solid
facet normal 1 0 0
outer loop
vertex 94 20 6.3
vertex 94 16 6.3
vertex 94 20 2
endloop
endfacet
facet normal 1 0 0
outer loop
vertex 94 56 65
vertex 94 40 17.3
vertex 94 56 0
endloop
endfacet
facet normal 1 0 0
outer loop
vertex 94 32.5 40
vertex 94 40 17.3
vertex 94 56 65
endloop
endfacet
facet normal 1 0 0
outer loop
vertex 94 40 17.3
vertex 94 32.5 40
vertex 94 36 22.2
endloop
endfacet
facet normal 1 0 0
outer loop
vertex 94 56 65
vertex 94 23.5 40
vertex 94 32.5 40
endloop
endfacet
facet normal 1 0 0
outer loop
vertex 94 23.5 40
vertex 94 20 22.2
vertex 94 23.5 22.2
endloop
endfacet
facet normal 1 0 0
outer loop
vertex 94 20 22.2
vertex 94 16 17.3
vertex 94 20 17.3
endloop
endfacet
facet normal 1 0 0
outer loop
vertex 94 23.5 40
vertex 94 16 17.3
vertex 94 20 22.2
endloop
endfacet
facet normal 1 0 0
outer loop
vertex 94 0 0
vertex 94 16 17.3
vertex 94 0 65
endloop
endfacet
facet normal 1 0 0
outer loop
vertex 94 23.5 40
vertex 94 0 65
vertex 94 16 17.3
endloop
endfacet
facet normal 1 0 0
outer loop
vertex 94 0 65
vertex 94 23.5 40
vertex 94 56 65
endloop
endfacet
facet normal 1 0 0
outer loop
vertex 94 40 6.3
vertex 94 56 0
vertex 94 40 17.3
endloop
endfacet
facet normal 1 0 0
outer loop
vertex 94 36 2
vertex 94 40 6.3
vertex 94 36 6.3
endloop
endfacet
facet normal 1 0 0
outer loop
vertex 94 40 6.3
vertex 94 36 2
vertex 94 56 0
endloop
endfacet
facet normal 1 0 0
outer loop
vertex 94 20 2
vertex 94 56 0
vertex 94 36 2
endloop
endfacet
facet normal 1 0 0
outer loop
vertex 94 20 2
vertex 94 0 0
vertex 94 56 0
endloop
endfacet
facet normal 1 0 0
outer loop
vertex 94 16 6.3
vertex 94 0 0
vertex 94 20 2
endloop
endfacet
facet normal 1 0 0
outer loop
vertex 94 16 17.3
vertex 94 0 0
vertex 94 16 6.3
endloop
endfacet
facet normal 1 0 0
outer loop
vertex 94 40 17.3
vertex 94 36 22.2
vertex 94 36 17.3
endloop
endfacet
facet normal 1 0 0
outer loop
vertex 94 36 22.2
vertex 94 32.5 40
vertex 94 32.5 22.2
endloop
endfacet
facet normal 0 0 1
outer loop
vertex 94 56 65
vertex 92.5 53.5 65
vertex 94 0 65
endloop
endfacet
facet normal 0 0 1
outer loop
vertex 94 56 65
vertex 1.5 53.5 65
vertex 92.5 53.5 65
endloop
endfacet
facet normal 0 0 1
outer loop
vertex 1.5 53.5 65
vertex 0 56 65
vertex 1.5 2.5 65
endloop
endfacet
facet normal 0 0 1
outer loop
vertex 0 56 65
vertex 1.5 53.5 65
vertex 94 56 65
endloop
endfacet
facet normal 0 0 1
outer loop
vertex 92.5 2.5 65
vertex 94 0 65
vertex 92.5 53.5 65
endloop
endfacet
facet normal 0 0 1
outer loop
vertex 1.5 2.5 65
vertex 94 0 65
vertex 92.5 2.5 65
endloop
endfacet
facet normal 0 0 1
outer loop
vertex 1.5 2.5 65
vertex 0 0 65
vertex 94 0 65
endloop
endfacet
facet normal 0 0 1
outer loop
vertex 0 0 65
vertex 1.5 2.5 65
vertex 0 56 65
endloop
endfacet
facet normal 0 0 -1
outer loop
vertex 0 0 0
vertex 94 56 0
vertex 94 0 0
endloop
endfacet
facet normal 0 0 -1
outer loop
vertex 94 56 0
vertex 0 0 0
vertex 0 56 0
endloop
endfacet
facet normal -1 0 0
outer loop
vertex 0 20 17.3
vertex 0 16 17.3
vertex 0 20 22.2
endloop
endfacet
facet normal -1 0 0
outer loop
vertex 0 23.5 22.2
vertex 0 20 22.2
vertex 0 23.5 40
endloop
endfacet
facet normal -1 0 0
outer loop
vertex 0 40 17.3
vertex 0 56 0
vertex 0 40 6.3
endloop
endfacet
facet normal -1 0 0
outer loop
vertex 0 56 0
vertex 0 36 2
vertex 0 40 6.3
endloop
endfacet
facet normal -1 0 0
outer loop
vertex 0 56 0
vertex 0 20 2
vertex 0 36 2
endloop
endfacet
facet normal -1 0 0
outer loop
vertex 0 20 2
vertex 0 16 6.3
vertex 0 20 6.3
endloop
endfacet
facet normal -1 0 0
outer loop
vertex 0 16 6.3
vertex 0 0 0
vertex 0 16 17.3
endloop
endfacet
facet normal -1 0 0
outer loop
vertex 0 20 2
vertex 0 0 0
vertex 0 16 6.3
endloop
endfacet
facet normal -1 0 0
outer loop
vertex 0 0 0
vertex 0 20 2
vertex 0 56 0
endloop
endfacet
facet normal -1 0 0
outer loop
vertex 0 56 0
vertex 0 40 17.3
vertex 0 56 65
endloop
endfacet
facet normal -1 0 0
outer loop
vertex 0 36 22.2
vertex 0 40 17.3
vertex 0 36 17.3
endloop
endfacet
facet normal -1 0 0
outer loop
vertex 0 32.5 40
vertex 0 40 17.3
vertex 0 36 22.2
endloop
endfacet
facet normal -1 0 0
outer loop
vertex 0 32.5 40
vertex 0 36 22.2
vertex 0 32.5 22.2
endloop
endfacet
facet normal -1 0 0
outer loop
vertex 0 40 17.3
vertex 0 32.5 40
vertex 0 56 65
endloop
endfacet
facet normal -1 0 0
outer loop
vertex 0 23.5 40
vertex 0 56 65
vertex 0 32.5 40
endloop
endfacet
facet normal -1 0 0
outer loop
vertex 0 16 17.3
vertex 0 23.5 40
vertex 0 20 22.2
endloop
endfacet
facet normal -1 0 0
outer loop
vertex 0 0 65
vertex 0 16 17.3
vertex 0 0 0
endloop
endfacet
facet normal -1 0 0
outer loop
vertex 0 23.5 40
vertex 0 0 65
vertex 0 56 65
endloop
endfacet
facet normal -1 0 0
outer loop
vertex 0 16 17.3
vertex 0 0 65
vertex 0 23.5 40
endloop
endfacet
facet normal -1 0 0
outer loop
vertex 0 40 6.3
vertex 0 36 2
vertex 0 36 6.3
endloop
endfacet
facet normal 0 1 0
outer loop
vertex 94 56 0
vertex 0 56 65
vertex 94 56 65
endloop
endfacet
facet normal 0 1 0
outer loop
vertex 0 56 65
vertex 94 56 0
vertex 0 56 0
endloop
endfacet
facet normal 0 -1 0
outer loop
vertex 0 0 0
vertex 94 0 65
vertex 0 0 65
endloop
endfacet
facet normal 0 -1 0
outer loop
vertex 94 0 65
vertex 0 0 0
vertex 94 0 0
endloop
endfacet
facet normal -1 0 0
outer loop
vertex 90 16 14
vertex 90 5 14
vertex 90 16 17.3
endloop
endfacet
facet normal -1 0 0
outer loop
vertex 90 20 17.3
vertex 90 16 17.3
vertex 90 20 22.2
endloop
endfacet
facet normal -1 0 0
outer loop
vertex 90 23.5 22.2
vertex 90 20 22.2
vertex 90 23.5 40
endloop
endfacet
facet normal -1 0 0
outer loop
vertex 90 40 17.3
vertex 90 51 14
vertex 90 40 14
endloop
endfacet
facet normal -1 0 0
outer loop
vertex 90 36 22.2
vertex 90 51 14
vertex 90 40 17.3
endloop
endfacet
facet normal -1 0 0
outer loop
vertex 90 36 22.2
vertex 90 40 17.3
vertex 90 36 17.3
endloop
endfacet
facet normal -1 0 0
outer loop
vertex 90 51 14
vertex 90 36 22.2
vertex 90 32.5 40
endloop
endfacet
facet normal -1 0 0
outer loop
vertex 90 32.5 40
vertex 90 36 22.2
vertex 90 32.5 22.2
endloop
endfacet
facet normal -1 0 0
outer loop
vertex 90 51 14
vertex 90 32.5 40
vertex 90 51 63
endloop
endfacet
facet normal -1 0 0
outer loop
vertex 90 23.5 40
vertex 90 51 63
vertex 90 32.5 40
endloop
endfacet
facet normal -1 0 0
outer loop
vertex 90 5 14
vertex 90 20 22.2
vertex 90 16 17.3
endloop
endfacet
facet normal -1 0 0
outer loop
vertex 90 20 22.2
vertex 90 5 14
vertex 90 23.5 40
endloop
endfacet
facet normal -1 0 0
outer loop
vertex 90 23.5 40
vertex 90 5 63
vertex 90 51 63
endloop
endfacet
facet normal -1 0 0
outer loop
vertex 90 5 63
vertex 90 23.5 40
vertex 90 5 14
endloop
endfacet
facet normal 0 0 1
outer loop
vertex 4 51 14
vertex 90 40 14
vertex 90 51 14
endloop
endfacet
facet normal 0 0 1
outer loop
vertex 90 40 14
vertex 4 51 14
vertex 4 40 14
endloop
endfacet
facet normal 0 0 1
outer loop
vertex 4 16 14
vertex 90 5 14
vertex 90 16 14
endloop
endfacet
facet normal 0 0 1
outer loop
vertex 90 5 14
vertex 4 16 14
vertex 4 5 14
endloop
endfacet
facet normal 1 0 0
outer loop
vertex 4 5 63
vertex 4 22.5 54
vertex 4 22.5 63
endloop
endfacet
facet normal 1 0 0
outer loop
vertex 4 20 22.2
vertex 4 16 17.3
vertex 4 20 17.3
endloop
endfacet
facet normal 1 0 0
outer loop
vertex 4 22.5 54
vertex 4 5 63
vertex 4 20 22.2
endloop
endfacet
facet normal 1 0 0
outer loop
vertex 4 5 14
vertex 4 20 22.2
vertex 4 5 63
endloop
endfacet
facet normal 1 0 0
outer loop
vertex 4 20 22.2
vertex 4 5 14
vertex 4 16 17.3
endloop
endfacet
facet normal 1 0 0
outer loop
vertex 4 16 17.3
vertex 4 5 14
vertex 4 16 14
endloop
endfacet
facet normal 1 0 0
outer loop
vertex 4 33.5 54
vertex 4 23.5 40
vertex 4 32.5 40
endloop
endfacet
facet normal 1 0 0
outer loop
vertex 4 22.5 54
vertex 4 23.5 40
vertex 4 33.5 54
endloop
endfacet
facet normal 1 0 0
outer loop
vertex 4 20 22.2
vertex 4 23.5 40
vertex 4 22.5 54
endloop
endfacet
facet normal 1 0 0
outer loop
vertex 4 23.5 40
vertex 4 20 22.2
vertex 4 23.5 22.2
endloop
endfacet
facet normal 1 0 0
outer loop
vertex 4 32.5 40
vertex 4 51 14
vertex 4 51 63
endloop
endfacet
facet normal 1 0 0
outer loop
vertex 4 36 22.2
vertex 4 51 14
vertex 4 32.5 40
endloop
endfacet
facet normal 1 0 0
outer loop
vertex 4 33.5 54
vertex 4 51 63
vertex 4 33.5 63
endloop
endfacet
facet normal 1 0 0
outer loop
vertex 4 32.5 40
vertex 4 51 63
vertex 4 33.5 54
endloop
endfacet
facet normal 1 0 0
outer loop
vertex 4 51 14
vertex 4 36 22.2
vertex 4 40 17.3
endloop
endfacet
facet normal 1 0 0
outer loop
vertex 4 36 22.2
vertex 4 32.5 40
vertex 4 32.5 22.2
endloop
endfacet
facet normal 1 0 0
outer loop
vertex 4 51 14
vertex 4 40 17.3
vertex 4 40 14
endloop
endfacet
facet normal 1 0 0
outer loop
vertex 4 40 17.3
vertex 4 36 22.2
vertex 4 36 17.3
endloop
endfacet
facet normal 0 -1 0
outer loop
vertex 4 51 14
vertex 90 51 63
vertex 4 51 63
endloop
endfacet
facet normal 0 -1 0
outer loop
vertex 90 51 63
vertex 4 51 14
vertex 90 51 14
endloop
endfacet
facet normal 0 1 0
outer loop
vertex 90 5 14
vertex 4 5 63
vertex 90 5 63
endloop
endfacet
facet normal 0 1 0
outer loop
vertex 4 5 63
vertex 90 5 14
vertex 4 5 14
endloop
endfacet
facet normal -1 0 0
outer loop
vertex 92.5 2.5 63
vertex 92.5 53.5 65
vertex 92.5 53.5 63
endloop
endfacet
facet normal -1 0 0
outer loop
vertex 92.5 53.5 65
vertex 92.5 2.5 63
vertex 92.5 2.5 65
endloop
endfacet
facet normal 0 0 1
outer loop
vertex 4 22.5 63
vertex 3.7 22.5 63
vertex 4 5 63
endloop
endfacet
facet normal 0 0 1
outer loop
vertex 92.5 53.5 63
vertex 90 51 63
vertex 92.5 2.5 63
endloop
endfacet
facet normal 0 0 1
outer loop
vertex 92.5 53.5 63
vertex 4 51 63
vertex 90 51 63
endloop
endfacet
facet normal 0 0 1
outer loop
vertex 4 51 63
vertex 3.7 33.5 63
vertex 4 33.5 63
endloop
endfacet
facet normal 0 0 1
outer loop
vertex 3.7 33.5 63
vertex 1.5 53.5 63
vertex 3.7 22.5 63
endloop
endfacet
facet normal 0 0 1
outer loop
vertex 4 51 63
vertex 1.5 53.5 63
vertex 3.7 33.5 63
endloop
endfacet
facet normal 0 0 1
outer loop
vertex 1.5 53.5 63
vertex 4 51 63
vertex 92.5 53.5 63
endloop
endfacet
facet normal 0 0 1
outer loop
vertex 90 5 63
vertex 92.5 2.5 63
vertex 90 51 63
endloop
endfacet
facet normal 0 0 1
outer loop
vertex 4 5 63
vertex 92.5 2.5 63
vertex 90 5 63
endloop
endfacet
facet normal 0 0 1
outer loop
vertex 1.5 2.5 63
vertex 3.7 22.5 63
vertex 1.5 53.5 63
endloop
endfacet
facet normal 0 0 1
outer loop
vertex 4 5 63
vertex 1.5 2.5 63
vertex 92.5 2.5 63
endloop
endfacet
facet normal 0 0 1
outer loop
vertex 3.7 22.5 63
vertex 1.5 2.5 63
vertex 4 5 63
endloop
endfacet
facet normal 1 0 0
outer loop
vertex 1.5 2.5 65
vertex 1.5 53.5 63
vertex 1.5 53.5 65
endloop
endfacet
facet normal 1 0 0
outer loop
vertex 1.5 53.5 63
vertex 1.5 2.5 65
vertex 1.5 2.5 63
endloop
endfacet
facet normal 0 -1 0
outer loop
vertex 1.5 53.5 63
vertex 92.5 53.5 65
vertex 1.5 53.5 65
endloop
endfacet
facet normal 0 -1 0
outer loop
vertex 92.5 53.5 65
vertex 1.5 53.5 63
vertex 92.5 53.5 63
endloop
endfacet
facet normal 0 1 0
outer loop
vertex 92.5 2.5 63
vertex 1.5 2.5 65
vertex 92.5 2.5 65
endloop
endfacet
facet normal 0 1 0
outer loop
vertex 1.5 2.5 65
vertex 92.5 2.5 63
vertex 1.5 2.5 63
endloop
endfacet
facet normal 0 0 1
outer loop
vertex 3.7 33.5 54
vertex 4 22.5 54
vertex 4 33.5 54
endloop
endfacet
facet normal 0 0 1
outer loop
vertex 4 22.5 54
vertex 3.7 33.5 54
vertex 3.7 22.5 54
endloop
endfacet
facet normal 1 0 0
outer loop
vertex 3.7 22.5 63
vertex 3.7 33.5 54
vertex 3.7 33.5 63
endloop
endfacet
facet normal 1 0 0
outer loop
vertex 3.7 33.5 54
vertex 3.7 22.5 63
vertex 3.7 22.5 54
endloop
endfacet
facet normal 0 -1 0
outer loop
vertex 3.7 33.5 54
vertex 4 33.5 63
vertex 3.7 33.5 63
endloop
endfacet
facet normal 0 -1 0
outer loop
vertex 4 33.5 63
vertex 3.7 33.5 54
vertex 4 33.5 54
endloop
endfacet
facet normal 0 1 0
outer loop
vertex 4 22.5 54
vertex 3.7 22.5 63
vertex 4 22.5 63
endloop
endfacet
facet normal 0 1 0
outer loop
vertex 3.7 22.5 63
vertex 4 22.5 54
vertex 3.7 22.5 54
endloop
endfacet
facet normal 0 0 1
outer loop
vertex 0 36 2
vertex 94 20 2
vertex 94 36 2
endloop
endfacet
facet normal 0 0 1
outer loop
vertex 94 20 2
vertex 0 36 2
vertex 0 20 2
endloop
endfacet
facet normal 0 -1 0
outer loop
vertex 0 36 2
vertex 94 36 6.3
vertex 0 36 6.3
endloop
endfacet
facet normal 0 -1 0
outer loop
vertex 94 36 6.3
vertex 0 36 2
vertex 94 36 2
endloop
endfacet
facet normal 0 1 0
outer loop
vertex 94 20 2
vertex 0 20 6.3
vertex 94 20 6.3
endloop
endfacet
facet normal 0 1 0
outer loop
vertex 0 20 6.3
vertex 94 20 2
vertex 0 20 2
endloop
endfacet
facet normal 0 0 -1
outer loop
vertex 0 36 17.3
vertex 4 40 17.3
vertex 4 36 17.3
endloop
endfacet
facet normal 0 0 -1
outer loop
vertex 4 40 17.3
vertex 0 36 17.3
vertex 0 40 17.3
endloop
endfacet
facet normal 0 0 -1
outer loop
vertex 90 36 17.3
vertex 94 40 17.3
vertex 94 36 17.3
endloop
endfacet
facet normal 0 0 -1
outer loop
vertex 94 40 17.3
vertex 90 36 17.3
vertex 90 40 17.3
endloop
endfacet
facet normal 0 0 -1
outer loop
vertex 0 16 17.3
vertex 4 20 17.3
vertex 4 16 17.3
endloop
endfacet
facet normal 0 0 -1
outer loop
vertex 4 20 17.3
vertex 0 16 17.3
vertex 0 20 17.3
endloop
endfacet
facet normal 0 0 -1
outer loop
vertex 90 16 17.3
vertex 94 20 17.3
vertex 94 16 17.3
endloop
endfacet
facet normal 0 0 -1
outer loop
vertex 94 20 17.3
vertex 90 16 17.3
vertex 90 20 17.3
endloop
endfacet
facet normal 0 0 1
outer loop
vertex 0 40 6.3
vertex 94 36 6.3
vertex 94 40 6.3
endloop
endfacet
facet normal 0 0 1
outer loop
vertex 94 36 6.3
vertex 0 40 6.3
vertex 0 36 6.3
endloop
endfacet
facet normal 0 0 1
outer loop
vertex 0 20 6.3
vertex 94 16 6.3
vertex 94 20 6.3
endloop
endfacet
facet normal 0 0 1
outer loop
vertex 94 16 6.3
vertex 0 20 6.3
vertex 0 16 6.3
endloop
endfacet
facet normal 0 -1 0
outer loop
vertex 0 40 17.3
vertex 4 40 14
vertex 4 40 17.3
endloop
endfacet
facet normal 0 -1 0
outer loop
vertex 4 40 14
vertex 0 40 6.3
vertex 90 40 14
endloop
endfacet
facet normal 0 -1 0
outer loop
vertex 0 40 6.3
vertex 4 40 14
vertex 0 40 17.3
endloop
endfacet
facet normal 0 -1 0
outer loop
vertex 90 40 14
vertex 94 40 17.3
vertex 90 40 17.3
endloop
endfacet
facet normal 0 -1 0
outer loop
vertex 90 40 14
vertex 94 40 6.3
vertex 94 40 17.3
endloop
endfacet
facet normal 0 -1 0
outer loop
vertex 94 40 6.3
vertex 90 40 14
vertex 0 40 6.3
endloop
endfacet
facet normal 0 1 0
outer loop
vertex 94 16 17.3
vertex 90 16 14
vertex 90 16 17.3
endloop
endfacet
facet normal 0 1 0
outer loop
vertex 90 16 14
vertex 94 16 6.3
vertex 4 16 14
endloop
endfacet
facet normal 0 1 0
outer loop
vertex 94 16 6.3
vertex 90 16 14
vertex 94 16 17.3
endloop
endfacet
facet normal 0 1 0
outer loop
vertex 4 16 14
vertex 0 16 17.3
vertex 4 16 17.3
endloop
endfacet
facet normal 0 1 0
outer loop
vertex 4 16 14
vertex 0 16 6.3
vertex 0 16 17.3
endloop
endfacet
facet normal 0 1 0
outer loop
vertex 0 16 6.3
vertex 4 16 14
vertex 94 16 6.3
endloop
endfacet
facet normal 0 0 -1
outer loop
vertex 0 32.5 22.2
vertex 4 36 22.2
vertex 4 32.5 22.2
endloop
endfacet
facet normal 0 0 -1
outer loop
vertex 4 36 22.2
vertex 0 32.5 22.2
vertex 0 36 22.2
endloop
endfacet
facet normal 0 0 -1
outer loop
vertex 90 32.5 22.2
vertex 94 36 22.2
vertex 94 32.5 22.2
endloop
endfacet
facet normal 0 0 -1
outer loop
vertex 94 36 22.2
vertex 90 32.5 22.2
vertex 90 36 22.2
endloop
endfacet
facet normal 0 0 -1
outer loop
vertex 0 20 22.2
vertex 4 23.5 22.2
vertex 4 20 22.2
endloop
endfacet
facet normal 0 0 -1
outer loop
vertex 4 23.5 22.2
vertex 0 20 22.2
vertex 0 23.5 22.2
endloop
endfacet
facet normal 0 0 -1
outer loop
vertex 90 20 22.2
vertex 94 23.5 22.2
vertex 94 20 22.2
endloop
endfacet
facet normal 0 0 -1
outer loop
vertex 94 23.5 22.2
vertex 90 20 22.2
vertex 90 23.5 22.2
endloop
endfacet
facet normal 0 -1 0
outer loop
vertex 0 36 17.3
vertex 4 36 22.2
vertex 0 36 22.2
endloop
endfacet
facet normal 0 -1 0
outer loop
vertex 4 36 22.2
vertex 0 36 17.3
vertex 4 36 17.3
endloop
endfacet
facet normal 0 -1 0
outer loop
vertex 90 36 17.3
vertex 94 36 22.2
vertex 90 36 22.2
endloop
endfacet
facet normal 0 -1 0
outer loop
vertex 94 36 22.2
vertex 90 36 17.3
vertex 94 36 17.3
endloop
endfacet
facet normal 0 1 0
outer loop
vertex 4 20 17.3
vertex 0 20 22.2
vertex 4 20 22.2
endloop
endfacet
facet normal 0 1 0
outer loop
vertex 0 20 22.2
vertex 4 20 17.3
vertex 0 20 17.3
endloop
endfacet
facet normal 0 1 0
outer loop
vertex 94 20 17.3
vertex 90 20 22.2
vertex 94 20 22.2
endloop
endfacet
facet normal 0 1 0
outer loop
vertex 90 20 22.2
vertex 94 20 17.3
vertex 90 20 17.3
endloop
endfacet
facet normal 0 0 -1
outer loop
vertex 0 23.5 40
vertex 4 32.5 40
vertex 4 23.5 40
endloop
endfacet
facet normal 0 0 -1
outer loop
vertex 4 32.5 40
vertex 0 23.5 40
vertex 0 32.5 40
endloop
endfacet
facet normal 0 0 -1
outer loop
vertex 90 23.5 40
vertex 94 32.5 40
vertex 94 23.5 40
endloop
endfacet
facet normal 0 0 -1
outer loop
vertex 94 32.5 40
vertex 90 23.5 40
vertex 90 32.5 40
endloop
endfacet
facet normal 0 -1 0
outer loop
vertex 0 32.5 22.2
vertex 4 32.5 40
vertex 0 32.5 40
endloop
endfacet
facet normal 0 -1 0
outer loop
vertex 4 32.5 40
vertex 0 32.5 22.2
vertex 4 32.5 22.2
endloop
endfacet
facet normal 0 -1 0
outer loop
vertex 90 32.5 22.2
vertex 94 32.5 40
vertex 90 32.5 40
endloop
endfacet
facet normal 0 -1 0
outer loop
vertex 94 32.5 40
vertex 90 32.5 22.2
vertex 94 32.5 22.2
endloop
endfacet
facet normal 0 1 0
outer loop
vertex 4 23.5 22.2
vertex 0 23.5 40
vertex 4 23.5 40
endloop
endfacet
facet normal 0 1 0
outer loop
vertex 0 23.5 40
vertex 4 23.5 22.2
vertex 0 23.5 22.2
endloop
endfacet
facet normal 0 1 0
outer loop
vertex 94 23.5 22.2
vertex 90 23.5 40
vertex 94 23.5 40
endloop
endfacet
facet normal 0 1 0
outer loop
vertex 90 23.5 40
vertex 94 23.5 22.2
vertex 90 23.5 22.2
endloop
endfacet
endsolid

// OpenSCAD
difference()
{
	cube([94,56,65]);
	translate([4,5,14]) cube([86,46,55]);
	translate([1.5,2.5,63]) cube([91,51,3]);
	translate([3.7,22.5,54]) cube([1,11,11]);
	translate([89,22.5,54]) cube([1,11,11]);
	translate([-1,20,2]) cube([105,16,7]);
	translate([-1,16,6.3]) cube([105,24,11]);
	translate([-1,20,15.2]) cube([105,16,7]);
	translate([-1,23.5,22]) cube([105,9,18]);
}
